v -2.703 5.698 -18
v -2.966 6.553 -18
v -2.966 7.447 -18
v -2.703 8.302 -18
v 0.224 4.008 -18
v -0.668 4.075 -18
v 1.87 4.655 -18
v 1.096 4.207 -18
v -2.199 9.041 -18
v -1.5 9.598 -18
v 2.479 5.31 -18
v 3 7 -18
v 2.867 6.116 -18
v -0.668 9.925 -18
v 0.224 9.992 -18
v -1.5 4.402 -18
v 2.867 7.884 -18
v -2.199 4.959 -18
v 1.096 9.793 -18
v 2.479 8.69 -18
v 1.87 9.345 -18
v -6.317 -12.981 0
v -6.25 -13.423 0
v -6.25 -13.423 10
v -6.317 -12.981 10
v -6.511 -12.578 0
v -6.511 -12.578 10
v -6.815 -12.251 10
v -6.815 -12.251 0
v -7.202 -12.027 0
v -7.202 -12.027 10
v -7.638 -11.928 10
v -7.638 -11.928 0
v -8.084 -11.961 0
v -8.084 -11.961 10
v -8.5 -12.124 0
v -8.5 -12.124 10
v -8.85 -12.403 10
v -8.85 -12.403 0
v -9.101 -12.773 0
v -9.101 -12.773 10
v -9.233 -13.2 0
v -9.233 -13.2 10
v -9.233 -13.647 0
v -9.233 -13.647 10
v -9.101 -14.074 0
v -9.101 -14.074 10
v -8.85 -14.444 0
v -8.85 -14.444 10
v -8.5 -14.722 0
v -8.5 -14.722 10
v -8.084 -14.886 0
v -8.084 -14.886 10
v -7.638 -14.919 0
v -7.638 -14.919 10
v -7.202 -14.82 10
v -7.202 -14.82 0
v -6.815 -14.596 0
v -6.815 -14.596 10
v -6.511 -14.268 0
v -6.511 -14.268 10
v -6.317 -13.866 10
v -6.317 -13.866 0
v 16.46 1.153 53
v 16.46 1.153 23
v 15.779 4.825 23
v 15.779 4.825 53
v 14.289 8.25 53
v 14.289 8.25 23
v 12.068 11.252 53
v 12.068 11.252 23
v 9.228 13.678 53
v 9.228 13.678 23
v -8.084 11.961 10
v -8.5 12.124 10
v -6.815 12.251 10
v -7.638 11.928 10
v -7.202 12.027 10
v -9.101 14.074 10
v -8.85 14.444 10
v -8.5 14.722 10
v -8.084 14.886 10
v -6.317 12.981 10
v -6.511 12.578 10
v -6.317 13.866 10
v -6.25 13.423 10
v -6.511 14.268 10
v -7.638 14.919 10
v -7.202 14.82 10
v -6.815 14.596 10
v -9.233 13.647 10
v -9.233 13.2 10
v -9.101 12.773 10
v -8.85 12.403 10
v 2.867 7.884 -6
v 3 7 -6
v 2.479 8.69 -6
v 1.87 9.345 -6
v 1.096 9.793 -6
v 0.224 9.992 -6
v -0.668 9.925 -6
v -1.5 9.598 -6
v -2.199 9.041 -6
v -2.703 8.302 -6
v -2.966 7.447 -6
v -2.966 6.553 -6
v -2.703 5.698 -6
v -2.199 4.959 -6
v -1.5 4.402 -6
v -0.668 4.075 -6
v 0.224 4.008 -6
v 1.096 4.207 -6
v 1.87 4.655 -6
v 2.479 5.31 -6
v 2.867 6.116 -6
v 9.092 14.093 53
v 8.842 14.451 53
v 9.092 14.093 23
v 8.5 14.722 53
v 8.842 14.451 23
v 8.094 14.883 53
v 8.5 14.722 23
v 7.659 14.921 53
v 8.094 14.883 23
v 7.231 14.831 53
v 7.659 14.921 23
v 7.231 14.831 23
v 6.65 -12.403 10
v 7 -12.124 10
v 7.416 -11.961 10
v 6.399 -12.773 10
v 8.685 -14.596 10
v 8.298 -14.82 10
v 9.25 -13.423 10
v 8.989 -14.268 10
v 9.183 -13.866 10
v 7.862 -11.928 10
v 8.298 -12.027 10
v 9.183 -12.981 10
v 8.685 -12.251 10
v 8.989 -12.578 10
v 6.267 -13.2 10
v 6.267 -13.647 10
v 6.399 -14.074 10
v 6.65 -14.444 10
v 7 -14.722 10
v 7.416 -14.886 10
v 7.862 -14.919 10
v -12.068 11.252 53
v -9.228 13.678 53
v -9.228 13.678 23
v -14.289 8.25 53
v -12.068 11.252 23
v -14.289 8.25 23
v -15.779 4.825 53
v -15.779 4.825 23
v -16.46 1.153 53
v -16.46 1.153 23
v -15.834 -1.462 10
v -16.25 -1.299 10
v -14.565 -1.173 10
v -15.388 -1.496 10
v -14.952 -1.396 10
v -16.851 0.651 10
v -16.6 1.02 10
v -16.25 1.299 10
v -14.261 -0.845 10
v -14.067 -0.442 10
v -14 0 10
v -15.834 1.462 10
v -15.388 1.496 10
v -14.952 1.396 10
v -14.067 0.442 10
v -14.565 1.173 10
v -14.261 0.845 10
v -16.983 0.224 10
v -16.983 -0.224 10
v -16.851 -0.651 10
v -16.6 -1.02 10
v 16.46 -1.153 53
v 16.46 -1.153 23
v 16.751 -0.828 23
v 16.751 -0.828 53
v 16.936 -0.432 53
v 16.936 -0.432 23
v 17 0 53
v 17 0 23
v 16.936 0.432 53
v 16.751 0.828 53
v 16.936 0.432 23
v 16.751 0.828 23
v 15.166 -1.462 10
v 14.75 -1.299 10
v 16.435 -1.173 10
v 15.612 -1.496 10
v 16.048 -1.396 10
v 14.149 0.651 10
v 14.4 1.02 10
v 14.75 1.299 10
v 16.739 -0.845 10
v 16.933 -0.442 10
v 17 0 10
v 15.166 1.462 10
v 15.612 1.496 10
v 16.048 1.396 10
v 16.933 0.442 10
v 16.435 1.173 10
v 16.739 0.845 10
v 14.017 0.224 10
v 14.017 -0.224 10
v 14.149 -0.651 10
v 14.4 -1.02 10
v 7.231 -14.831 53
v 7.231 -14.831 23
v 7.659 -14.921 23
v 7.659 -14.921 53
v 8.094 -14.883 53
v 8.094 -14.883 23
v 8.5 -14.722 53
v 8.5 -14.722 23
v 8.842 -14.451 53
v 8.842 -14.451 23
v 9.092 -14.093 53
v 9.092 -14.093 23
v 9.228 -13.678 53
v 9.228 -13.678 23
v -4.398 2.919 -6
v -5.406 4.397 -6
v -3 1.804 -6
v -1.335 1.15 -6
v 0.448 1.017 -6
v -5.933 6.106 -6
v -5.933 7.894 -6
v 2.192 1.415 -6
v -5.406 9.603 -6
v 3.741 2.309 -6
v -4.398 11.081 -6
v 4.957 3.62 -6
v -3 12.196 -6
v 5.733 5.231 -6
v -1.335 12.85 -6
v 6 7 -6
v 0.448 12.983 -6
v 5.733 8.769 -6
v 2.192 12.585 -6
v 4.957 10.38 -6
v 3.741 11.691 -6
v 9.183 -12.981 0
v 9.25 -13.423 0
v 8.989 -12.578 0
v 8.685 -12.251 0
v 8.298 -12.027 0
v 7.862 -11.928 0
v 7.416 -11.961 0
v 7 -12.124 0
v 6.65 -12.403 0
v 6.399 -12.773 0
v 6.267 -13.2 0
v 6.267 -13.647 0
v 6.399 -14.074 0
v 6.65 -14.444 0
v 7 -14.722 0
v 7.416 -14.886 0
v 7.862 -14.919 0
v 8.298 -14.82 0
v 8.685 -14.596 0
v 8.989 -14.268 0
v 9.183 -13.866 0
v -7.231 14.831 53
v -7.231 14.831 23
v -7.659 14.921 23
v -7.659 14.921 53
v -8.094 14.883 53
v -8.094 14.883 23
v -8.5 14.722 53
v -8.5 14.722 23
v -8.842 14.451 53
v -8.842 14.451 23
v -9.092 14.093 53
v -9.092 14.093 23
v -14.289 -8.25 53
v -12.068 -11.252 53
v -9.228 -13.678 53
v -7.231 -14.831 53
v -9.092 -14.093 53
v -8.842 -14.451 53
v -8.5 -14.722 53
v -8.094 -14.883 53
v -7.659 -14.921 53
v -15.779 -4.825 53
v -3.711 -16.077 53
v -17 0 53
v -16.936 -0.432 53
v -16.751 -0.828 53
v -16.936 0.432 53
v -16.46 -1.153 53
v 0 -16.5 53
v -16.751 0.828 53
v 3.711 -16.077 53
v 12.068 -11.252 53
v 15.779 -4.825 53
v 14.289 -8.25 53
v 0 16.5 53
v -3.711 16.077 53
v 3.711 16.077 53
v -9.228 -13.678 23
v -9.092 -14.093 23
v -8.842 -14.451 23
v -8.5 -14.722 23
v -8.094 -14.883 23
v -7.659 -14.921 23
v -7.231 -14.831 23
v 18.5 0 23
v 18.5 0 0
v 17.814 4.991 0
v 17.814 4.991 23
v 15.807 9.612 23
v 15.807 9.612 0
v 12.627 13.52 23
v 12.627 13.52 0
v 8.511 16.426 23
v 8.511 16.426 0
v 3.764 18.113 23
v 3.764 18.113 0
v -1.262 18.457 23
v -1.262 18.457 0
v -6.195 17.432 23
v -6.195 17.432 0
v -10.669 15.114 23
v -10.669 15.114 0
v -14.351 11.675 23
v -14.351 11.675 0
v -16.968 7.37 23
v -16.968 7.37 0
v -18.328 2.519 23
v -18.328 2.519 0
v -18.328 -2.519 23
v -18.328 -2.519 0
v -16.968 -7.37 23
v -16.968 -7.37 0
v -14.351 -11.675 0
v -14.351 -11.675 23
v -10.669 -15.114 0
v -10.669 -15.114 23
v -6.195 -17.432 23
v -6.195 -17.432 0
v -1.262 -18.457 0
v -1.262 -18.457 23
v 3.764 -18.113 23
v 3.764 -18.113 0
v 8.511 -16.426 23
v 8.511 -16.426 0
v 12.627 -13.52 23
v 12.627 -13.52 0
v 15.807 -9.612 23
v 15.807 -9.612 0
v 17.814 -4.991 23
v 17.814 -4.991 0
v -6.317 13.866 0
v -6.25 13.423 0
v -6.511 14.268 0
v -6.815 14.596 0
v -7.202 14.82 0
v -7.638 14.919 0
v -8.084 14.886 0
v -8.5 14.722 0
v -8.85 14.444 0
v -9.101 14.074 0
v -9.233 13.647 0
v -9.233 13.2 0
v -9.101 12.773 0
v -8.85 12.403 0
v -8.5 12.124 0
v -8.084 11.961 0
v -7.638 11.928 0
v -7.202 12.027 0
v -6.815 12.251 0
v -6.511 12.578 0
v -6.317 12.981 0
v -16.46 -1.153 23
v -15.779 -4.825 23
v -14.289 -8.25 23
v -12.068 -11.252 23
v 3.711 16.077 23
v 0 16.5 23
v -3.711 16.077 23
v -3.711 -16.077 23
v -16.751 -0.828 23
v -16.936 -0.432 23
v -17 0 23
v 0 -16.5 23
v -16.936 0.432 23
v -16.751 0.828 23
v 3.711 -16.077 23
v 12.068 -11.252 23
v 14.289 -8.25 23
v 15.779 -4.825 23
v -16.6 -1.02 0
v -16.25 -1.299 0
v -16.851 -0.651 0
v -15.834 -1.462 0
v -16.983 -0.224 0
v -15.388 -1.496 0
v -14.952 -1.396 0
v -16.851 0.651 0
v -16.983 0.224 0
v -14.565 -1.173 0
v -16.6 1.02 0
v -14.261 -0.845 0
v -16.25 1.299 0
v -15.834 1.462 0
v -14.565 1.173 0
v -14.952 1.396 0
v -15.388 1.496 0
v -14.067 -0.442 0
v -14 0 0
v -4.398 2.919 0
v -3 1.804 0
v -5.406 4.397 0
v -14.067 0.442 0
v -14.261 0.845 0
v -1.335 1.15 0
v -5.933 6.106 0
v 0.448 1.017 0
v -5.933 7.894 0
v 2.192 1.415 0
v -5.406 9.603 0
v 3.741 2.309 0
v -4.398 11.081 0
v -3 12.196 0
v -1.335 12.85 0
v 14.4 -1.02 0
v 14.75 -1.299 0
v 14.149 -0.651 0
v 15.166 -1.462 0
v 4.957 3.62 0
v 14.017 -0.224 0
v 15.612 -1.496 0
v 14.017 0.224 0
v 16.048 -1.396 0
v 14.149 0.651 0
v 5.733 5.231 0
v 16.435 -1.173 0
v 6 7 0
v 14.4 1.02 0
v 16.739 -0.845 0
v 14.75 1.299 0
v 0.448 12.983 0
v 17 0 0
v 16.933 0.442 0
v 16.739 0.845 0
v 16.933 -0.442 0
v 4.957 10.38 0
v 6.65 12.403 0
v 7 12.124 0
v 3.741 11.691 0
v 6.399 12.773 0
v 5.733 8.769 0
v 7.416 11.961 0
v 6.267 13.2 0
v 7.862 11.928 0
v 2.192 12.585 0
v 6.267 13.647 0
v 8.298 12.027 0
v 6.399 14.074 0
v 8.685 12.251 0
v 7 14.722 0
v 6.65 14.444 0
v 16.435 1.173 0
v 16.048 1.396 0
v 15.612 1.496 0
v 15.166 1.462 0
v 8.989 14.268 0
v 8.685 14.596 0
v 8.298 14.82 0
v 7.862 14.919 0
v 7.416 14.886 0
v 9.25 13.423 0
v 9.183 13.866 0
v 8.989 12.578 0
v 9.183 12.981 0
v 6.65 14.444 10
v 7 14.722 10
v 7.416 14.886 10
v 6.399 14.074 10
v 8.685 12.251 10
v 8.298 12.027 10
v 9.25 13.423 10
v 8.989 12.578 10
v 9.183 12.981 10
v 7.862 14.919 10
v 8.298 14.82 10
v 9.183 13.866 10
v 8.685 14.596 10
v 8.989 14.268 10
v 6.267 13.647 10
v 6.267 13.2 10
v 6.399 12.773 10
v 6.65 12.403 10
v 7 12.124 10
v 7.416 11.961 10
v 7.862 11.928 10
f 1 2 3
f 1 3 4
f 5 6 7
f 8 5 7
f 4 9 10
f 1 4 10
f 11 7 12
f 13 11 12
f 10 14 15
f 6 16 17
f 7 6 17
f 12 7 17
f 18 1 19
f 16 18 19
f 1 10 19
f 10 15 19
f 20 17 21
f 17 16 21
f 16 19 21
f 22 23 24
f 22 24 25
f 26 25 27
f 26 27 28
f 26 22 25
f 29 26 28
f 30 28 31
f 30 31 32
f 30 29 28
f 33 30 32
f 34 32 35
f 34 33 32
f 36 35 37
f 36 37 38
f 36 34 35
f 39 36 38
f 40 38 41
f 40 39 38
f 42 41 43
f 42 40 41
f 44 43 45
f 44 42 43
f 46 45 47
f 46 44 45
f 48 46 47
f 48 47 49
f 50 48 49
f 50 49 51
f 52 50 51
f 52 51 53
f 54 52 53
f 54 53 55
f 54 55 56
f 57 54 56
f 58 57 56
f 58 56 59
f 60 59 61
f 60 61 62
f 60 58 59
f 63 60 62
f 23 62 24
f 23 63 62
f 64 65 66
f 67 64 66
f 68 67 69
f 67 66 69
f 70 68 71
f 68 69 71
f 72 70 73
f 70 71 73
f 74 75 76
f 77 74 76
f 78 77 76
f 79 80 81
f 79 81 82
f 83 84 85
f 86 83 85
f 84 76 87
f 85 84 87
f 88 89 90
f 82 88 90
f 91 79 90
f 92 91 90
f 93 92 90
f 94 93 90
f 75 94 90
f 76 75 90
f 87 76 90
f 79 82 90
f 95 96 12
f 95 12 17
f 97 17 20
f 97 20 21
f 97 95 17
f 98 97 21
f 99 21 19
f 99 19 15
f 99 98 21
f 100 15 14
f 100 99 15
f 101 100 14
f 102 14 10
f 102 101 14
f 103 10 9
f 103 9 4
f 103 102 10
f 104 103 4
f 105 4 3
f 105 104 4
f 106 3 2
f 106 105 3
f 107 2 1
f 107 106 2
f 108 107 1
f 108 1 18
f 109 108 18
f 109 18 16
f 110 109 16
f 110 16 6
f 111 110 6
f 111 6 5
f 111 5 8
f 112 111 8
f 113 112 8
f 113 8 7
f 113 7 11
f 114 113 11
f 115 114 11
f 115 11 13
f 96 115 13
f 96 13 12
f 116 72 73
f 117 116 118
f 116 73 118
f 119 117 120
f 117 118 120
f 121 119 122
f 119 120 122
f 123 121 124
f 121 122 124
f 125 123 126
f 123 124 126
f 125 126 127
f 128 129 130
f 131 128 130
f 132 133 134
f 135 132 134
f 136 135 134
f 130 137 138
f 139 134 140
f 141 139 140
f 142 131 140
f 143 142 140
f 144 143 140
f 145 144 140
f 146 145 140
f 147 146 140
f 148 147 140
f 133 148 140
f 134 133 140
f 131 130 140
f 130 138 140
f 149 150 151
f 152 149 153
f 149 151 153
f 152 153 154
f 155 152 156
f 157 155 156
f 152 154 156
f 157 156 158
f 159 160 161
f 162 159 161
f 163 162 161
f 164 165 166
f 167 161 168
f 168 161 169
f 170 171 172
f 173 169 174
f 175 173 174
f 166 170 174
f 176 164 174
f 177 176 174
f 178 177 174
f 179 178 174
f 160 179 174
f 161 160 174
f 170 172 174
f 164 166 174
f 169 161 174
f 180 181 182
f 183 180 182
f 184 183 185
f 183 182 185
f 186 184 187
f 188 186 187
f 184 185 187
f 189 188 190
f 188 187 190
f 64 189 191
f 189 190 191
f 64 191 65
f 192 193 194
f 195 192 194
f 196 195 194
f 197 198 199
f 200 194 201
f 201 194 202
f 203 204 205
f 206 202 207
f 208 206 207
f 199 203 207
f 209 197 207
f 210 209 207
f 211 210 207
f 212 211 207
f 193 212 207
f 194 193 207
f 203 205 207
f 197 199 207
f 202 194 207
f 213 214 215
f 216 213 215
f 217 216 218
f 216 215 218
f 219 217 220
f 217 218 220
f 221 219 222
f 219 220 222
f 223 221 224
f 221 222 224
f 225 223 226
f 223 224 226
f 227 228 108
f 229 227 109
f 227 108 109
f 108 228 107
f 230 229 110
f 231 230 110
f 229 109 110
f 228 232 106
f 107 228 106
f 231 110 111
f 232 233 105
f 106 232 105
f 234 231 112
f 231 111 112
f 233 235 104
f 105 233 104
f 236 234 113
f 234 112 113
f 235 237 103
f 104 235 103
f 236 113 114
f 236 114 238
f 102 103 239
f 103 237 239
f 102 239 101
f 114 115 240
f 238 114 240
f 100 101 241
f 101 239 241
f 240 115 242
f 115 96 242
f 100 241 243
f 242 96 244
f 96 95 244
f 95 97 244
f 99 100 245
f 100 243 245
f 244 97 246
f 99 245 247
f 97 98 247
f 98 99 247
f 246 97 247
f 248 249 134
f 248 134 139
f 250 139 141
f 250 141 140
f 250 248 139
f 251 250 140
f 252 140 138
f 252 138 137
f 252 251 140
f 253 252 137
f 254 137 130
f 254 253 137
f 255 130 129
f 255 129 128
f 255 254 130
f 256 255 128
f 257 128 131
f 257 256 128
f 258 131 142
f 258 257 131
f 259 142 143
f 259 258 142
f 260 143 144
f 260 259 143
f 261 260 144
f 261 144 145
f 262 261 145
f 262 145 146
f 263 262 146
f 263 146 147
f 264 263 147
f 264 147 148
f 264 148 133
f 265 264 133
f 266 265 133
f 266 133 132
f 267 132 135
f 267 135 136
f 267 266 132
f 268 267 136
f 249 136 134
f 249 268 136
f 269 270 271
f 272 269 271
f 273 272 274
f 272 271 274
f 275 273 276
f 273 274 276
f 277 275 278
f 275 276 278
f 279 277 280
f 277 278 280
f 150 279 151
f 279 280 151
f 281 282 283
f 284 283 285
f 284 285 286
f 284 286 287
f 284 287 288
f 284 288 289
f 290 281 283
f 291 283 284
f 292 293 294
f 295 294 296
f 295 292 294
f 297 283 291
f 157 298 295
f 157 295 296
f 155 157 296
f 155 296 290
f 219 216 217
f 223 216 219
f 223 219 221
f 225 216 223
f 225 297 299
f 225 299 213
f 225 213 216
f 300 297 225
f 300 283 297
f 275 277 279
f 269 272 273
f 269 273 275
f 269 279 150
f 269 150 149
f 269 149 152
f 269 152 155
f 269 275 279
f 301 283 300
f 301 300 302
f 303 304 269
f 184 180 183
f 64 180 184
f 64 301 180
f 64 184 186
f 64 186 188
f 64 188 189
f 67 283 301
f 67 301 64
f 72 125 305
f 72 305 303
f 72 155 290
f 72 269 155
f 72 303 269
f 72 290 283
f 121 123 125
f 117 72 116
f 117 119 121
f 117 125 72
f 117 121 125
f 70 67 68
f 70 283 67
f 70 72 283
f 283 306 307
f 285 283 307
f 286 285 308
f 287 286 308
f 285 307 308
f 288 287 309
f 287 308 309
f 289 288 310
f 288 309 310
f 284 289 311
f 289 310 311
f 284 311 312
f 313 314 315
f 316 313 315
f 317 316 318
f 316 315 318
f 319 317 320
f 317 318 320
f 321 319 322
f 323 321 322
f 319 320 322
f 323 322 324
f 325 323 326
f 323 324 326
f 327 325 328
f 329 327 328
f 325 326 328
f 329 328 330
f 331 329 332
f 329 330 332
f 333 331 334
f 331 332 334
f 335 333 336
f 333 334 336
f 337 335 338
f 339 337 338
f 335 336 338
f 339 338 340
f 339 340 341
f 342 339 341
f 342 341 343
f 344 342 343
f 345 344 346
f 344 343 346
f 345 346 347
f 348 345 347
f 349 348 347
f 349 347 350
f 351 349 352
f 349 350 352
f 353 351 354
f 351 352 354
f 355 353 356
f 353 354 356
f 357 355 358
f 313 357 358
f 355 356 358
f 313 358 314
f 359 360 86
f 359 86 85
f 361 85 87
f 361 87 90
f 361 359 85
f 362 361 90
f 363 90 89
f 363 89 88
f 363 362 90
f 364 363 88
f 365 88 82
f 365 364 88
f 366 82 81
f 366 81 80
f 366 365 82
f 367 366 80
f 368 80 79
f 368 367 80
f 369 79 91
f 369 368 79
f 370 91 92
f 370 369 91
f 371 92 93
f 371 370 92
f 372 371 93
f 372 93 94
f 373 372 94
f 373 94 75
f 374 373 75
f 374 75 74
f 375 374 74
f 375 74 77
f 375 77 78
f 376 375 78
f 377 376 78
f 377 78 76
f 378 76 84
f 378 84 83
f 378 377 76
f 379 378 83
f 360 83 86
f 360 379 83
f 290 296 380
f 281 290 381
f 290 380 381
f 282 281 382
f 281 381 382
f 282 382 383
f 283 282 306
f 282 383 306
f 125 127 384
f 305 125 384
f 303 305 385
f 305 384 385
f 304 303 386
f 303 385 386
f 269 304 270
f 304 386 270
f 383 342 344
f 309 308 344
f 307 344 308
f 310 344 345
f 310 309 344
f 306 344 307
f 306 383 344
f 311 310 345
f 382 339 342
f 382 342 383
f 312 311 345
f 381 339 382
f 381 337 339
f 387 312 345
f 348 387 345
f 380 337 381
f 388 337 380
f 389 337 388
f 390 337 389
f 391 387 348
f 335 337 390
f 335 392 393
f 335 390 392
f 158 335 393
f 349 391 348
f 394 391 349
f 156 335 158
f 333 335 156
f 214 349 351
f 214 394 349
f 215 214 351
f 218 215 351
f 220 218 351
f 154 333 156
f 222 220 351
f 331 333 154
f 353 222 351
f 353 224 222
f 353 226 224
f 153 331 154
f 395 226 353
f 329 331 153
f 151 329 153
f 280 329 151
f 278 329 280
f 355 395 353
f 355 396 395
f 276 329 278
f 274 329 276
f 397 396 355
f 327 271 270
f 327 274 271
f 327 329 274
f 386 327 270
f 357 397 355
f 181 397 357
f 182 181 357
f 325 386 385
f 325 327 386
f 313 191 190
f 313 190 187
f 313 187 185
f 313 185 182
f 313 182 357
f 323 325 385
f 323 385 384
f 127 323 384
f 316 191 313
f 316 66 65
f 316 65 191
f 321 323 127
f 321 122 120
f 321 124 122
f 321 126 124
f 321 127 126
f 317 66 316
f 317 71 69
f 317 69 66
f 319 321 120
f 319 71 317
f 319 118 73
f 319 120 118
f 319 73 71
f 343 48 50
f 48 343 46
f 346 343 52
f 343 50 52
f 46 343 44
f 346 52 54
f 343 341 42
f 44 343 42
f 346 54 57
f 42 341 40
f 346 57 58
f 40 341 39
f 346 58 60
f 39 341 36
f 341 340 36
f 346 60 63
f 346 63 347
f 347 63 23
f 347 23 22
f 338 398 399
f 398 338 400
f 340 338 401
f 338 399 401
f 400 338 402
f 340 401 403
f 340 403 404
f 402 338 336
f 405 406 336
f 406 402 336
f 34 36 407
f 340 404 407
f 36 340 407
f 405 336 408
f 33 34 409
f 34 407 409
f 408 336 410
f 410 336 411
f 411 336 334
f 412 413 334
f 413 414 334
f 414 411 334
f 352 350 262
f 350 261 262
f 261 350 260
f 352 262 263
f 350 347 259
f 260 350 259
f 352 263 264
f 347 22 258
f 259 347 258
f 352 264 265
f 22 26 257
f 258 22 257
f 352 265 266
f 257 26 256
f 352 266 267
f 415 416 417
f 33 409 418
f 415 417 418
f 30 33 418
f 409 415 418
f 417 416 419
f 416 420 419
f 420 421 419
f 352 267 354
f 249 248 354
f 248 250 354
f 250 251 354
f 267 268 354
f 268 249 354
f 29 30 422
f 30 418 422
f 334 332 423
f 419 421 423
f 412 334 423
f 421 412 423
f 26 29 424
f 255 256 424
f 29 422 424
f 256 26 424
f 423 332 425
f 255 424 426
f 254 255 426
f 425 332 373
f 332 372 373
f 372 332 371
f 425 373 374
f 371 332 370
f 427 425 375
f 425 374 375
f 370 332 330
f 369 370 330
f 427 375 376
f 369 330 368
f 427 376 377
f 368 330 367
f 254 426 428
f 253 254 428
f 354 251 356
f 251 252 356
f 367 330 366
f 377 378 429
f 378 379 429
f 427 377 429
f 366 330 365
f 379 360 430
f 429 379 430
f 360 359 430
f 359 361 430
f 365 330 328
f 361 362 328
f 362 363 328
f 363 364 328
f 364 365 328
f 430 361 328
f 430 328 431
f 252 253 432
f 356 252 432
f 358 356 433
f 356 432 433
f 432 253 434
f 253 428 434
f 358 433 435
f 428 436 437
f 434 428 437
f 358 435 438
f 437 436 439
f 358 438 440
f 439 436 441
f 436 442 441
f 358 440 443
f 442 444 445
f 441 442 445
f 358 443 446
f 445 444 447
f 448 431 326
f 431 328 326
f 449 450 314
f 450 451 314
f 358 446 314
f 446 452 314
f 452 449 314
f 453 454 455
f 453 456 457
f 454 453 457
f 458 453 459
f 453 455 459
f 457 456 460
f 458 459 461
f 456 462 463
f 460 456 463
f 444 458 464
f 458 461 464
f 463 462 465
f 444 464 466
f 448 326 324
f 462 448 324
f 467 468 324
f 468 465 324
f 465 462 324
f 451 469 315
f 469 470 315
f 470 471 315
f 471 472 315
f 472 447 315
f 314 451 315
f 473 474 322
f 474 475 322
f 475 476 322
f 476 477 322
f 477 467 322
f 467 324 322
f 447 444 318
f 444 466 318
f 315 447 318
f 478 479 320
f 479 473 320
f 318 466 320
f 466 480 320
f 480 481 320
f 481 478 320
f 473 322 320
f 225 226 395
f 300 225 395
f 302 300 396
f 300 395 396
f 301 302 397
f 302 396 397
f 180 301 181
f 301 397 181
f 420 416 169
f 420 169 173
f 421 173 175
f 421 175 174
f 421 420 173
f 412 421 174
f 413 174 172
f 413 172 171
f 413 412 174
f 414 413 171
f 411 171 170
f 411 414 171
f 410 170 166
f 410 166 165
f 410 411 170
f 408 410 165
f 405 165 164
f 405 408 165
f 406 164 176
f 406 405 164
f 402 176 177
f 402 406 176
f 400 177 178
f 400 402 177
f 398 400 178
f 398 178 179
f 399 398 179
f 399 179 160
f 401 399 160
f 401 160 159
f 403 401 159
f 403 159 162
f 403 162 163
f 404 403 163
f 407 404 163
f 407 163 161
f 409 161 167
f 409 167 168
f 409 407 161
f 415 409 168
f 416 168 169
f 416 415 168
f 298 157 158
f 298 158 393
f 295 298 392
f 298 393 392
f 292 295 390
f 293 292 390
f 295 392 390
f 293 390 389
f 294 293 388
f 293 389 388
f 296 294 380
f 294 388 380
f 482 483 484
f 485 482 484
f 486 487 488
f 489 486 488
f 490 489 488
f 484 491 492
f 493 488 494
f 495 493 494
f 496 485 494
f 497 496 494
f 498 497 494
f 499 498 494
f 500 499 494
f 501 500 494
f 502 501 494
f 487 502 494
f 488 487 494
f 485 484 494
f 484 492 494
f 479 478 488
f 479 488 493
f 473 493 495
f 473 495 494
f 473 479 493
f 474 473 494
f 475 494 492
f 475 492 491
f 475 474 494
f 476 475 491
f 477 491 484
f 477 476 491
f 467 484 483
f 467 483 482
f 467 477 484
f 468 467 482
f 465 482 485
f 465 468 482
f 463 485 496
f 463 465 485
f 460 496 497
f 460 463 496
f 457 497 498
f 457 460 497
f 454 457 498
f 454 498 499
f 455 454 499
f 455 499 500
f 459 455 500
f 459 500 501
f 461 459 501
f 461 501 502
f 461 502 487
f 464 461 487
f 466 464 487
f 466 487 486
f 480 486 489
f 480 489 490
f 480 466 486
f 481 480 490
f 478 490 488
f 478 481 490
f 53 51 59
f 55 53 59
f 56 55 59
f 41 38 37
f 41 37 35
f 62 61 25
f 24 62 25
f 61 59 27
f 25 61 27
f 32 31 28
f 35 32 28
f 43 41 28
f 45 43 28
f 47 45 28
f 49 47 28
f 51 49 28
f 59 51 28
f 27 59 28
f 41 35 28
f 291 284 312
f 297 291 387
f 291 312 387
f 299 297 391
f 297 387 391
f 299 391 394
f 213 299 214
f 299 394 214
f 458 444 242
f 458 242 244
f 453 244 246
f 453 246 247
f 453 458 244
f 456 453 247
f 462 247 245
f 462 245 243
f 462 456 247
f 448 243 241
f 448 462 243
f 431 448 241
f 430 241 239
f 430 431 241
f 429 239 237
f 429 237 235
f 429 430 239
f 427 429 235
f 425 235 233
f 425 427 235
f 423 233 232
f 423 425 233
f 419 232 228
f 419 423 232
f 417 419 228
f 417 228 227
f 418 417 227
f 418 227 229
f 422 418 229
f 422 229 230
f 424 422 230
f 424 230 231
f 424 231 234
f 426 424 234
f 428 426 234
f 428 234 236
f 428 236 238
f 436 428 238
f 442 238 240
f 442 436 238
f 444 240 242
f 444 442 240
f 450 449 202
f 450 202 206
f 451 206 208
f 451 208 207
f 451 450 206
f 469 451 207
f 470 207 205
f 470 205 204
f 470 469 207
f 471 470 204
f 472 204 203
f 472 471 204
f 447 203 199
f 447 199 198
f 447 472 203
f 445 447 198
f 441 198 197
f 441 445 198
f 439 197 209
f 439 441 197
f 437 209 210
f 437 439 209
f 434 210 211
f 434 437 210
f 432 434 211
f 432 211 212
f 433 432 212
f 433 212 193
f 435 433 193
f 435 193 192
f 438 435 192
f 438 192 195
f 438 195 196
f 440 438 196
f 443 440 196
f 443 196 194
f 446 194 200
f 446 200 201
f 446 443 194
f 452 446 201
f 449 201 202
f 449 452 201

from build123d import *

# Parameters (mm, degrees)
SKETCH_1_R          = 18.5
SKETCH_1_R_2        = 1.5
EXTRUDE_1_DEPTH     = 23
SKETCH_1_3_R        = 6
SKETCH_1_3_R_2      = 3
EXTRUDE_2_DEPTH     = 6
SKETCH_1_4_R        = 3
EXTRUDE_3_DEPTH     = 18
EXTRUDE_5_DEPTH     = 53
SKETCH_1_6_R        = 1.5
CUT_EXTRUDE_3_DEPTH = 10


with BuildPart() as part:
    # 草图1 → 凸台-拉伸1 (new body)
    with BuildSketch(Plane.XY):
        Circle(SKETCH_1_R)
        with Locations((7.75, 13.423393759)):
            Circle(SKETCH_1_R_2, mode=Mode.SUBTRACT)
        with Locations((-7.75, 13.423393759)):
            Circle(SKETCH_1_R_2, mode=Mode.SUBTRACT)
        with Locations((-15.5, 0)):
            Circle(SKETCH_1_R_2, mode=Mode.SUBTRACT)
        with Locations((-7.75, -13.423393759)):
            Circle(SKETCH_1_R_2, mode=Mode.SUBTRACT)
        with Locations((7.75, -13.423393759)):
            Circle(SKETCH_1_R_2, mode=Mode.SUBTRACT)
        with Locations((15.5, 0)):
            Circle(SKETCH_1_R_2, mode=Mode.SUBTRACT)
    extrude(amount=EXTRUDE_1_DEPTH)

    # 草图1<3> → 凸台-拉伸2 (add)
    with BuildSketch(Plane.XY):
        with Locations((0, 7)):
            Circle(SKETCH_1_3_R)
        with Locations((0, 7)):
            Circle(SKETCH_1_3_R_2, mode=Mode.SUBTRACT)
    extrude(amount=-EXTRUDE_2_DEPTH)

    # 草图1<4> → 凸台-拉伸3 (add)
    with BuildSketch(Plane.XY):
        with Locations((0, 7)):
            Circle(SKETCH_1_4_R)
    extrude(amount=-EXTRUDE_3_DEPTH)

    # 草图1<5> → 凸台-拉伸5 (add)
    with BuildSketch(Plane.XY):
        with BuildLine():
            ThreePointArc((16.459677419, -1.152830972), (17, 0), (16.459677419, 1.152830972))
            ThreePointArc((16.459677419, 1.152830972), (14.289419162, 8.25), (9.228219618, 13.678083297))
            ThreePointArc((9.228219618, 13.678083297), (8.5, 14.722431864), (7.231457801, 14.830914269))
            ThreePointArc((7.231457801, 14.830914269), (0, 16.5), (-7.231457801, 14.830914269))
            ThreePointArc((-7.231457801, 14.830914269), (-8.5, 14.722431864), (-9.228219618, 13.678083297))
            ThreePointArc((-9.228219618, 13.678083297), (-14.289419162, 8.25), (-16.459677419, 1.152830972))
            ThreePointArc((-16.459677419, 1.152830972), (-17, 0), (-16.459677419, -1.152830972))
            ThreePointArc((-16.459677419, -1.152830972), (-14.289419162, -8.25), (-9.228219618, -13.678083297))
            ThreePointArc((-9.228219618, -13.678083297), (-8.5, -14.722431864), (-7.231457801, -14.830914269))
            ThreePointArc((-7.231457801, -14.830914269), (0, -16.5), (7.231457801, -14.830914269))
            ThreePointArc((7.231457801, -14.830914269), (8.5, -14.722431864), (9.228219618, -13.678083297))
            ThreePointArc((9.228219618, -13.678083297), (14.289419162, -8.25), (16.459677419, -1.152830972))
        make_face()
    extrude(amount=EXTRUDE_5_DEPTH)

    # 草图1<6> → 切除-拉伸3 (cut)
    with BuildSketch(Plane.XY):
        with Locations((15.5, 0)):
            Circle(SKETCH_1_6_R)
        with Locations((7.75, 13.423393759)):
            Circle(SKETCH_1_6_R)
        with Locations((7.75, -13.423393759)):
            Circle(SKETCH_1_6_R)
        with Locations((-7.75, 13.423393759)):
            Circle(SKETCH_1_6_R)
        with Locations((-7.75, -13.423393759)):
            Circle(SKETCH_1_6_R)
        with Locations((-15.5, 0)):
            Circle(SKETCH_1_6_R)
    extrude(amount=CUT_EXTRUDE_3_DEPTH, mode=Mode.SUBTRACT)


solid = part.part
